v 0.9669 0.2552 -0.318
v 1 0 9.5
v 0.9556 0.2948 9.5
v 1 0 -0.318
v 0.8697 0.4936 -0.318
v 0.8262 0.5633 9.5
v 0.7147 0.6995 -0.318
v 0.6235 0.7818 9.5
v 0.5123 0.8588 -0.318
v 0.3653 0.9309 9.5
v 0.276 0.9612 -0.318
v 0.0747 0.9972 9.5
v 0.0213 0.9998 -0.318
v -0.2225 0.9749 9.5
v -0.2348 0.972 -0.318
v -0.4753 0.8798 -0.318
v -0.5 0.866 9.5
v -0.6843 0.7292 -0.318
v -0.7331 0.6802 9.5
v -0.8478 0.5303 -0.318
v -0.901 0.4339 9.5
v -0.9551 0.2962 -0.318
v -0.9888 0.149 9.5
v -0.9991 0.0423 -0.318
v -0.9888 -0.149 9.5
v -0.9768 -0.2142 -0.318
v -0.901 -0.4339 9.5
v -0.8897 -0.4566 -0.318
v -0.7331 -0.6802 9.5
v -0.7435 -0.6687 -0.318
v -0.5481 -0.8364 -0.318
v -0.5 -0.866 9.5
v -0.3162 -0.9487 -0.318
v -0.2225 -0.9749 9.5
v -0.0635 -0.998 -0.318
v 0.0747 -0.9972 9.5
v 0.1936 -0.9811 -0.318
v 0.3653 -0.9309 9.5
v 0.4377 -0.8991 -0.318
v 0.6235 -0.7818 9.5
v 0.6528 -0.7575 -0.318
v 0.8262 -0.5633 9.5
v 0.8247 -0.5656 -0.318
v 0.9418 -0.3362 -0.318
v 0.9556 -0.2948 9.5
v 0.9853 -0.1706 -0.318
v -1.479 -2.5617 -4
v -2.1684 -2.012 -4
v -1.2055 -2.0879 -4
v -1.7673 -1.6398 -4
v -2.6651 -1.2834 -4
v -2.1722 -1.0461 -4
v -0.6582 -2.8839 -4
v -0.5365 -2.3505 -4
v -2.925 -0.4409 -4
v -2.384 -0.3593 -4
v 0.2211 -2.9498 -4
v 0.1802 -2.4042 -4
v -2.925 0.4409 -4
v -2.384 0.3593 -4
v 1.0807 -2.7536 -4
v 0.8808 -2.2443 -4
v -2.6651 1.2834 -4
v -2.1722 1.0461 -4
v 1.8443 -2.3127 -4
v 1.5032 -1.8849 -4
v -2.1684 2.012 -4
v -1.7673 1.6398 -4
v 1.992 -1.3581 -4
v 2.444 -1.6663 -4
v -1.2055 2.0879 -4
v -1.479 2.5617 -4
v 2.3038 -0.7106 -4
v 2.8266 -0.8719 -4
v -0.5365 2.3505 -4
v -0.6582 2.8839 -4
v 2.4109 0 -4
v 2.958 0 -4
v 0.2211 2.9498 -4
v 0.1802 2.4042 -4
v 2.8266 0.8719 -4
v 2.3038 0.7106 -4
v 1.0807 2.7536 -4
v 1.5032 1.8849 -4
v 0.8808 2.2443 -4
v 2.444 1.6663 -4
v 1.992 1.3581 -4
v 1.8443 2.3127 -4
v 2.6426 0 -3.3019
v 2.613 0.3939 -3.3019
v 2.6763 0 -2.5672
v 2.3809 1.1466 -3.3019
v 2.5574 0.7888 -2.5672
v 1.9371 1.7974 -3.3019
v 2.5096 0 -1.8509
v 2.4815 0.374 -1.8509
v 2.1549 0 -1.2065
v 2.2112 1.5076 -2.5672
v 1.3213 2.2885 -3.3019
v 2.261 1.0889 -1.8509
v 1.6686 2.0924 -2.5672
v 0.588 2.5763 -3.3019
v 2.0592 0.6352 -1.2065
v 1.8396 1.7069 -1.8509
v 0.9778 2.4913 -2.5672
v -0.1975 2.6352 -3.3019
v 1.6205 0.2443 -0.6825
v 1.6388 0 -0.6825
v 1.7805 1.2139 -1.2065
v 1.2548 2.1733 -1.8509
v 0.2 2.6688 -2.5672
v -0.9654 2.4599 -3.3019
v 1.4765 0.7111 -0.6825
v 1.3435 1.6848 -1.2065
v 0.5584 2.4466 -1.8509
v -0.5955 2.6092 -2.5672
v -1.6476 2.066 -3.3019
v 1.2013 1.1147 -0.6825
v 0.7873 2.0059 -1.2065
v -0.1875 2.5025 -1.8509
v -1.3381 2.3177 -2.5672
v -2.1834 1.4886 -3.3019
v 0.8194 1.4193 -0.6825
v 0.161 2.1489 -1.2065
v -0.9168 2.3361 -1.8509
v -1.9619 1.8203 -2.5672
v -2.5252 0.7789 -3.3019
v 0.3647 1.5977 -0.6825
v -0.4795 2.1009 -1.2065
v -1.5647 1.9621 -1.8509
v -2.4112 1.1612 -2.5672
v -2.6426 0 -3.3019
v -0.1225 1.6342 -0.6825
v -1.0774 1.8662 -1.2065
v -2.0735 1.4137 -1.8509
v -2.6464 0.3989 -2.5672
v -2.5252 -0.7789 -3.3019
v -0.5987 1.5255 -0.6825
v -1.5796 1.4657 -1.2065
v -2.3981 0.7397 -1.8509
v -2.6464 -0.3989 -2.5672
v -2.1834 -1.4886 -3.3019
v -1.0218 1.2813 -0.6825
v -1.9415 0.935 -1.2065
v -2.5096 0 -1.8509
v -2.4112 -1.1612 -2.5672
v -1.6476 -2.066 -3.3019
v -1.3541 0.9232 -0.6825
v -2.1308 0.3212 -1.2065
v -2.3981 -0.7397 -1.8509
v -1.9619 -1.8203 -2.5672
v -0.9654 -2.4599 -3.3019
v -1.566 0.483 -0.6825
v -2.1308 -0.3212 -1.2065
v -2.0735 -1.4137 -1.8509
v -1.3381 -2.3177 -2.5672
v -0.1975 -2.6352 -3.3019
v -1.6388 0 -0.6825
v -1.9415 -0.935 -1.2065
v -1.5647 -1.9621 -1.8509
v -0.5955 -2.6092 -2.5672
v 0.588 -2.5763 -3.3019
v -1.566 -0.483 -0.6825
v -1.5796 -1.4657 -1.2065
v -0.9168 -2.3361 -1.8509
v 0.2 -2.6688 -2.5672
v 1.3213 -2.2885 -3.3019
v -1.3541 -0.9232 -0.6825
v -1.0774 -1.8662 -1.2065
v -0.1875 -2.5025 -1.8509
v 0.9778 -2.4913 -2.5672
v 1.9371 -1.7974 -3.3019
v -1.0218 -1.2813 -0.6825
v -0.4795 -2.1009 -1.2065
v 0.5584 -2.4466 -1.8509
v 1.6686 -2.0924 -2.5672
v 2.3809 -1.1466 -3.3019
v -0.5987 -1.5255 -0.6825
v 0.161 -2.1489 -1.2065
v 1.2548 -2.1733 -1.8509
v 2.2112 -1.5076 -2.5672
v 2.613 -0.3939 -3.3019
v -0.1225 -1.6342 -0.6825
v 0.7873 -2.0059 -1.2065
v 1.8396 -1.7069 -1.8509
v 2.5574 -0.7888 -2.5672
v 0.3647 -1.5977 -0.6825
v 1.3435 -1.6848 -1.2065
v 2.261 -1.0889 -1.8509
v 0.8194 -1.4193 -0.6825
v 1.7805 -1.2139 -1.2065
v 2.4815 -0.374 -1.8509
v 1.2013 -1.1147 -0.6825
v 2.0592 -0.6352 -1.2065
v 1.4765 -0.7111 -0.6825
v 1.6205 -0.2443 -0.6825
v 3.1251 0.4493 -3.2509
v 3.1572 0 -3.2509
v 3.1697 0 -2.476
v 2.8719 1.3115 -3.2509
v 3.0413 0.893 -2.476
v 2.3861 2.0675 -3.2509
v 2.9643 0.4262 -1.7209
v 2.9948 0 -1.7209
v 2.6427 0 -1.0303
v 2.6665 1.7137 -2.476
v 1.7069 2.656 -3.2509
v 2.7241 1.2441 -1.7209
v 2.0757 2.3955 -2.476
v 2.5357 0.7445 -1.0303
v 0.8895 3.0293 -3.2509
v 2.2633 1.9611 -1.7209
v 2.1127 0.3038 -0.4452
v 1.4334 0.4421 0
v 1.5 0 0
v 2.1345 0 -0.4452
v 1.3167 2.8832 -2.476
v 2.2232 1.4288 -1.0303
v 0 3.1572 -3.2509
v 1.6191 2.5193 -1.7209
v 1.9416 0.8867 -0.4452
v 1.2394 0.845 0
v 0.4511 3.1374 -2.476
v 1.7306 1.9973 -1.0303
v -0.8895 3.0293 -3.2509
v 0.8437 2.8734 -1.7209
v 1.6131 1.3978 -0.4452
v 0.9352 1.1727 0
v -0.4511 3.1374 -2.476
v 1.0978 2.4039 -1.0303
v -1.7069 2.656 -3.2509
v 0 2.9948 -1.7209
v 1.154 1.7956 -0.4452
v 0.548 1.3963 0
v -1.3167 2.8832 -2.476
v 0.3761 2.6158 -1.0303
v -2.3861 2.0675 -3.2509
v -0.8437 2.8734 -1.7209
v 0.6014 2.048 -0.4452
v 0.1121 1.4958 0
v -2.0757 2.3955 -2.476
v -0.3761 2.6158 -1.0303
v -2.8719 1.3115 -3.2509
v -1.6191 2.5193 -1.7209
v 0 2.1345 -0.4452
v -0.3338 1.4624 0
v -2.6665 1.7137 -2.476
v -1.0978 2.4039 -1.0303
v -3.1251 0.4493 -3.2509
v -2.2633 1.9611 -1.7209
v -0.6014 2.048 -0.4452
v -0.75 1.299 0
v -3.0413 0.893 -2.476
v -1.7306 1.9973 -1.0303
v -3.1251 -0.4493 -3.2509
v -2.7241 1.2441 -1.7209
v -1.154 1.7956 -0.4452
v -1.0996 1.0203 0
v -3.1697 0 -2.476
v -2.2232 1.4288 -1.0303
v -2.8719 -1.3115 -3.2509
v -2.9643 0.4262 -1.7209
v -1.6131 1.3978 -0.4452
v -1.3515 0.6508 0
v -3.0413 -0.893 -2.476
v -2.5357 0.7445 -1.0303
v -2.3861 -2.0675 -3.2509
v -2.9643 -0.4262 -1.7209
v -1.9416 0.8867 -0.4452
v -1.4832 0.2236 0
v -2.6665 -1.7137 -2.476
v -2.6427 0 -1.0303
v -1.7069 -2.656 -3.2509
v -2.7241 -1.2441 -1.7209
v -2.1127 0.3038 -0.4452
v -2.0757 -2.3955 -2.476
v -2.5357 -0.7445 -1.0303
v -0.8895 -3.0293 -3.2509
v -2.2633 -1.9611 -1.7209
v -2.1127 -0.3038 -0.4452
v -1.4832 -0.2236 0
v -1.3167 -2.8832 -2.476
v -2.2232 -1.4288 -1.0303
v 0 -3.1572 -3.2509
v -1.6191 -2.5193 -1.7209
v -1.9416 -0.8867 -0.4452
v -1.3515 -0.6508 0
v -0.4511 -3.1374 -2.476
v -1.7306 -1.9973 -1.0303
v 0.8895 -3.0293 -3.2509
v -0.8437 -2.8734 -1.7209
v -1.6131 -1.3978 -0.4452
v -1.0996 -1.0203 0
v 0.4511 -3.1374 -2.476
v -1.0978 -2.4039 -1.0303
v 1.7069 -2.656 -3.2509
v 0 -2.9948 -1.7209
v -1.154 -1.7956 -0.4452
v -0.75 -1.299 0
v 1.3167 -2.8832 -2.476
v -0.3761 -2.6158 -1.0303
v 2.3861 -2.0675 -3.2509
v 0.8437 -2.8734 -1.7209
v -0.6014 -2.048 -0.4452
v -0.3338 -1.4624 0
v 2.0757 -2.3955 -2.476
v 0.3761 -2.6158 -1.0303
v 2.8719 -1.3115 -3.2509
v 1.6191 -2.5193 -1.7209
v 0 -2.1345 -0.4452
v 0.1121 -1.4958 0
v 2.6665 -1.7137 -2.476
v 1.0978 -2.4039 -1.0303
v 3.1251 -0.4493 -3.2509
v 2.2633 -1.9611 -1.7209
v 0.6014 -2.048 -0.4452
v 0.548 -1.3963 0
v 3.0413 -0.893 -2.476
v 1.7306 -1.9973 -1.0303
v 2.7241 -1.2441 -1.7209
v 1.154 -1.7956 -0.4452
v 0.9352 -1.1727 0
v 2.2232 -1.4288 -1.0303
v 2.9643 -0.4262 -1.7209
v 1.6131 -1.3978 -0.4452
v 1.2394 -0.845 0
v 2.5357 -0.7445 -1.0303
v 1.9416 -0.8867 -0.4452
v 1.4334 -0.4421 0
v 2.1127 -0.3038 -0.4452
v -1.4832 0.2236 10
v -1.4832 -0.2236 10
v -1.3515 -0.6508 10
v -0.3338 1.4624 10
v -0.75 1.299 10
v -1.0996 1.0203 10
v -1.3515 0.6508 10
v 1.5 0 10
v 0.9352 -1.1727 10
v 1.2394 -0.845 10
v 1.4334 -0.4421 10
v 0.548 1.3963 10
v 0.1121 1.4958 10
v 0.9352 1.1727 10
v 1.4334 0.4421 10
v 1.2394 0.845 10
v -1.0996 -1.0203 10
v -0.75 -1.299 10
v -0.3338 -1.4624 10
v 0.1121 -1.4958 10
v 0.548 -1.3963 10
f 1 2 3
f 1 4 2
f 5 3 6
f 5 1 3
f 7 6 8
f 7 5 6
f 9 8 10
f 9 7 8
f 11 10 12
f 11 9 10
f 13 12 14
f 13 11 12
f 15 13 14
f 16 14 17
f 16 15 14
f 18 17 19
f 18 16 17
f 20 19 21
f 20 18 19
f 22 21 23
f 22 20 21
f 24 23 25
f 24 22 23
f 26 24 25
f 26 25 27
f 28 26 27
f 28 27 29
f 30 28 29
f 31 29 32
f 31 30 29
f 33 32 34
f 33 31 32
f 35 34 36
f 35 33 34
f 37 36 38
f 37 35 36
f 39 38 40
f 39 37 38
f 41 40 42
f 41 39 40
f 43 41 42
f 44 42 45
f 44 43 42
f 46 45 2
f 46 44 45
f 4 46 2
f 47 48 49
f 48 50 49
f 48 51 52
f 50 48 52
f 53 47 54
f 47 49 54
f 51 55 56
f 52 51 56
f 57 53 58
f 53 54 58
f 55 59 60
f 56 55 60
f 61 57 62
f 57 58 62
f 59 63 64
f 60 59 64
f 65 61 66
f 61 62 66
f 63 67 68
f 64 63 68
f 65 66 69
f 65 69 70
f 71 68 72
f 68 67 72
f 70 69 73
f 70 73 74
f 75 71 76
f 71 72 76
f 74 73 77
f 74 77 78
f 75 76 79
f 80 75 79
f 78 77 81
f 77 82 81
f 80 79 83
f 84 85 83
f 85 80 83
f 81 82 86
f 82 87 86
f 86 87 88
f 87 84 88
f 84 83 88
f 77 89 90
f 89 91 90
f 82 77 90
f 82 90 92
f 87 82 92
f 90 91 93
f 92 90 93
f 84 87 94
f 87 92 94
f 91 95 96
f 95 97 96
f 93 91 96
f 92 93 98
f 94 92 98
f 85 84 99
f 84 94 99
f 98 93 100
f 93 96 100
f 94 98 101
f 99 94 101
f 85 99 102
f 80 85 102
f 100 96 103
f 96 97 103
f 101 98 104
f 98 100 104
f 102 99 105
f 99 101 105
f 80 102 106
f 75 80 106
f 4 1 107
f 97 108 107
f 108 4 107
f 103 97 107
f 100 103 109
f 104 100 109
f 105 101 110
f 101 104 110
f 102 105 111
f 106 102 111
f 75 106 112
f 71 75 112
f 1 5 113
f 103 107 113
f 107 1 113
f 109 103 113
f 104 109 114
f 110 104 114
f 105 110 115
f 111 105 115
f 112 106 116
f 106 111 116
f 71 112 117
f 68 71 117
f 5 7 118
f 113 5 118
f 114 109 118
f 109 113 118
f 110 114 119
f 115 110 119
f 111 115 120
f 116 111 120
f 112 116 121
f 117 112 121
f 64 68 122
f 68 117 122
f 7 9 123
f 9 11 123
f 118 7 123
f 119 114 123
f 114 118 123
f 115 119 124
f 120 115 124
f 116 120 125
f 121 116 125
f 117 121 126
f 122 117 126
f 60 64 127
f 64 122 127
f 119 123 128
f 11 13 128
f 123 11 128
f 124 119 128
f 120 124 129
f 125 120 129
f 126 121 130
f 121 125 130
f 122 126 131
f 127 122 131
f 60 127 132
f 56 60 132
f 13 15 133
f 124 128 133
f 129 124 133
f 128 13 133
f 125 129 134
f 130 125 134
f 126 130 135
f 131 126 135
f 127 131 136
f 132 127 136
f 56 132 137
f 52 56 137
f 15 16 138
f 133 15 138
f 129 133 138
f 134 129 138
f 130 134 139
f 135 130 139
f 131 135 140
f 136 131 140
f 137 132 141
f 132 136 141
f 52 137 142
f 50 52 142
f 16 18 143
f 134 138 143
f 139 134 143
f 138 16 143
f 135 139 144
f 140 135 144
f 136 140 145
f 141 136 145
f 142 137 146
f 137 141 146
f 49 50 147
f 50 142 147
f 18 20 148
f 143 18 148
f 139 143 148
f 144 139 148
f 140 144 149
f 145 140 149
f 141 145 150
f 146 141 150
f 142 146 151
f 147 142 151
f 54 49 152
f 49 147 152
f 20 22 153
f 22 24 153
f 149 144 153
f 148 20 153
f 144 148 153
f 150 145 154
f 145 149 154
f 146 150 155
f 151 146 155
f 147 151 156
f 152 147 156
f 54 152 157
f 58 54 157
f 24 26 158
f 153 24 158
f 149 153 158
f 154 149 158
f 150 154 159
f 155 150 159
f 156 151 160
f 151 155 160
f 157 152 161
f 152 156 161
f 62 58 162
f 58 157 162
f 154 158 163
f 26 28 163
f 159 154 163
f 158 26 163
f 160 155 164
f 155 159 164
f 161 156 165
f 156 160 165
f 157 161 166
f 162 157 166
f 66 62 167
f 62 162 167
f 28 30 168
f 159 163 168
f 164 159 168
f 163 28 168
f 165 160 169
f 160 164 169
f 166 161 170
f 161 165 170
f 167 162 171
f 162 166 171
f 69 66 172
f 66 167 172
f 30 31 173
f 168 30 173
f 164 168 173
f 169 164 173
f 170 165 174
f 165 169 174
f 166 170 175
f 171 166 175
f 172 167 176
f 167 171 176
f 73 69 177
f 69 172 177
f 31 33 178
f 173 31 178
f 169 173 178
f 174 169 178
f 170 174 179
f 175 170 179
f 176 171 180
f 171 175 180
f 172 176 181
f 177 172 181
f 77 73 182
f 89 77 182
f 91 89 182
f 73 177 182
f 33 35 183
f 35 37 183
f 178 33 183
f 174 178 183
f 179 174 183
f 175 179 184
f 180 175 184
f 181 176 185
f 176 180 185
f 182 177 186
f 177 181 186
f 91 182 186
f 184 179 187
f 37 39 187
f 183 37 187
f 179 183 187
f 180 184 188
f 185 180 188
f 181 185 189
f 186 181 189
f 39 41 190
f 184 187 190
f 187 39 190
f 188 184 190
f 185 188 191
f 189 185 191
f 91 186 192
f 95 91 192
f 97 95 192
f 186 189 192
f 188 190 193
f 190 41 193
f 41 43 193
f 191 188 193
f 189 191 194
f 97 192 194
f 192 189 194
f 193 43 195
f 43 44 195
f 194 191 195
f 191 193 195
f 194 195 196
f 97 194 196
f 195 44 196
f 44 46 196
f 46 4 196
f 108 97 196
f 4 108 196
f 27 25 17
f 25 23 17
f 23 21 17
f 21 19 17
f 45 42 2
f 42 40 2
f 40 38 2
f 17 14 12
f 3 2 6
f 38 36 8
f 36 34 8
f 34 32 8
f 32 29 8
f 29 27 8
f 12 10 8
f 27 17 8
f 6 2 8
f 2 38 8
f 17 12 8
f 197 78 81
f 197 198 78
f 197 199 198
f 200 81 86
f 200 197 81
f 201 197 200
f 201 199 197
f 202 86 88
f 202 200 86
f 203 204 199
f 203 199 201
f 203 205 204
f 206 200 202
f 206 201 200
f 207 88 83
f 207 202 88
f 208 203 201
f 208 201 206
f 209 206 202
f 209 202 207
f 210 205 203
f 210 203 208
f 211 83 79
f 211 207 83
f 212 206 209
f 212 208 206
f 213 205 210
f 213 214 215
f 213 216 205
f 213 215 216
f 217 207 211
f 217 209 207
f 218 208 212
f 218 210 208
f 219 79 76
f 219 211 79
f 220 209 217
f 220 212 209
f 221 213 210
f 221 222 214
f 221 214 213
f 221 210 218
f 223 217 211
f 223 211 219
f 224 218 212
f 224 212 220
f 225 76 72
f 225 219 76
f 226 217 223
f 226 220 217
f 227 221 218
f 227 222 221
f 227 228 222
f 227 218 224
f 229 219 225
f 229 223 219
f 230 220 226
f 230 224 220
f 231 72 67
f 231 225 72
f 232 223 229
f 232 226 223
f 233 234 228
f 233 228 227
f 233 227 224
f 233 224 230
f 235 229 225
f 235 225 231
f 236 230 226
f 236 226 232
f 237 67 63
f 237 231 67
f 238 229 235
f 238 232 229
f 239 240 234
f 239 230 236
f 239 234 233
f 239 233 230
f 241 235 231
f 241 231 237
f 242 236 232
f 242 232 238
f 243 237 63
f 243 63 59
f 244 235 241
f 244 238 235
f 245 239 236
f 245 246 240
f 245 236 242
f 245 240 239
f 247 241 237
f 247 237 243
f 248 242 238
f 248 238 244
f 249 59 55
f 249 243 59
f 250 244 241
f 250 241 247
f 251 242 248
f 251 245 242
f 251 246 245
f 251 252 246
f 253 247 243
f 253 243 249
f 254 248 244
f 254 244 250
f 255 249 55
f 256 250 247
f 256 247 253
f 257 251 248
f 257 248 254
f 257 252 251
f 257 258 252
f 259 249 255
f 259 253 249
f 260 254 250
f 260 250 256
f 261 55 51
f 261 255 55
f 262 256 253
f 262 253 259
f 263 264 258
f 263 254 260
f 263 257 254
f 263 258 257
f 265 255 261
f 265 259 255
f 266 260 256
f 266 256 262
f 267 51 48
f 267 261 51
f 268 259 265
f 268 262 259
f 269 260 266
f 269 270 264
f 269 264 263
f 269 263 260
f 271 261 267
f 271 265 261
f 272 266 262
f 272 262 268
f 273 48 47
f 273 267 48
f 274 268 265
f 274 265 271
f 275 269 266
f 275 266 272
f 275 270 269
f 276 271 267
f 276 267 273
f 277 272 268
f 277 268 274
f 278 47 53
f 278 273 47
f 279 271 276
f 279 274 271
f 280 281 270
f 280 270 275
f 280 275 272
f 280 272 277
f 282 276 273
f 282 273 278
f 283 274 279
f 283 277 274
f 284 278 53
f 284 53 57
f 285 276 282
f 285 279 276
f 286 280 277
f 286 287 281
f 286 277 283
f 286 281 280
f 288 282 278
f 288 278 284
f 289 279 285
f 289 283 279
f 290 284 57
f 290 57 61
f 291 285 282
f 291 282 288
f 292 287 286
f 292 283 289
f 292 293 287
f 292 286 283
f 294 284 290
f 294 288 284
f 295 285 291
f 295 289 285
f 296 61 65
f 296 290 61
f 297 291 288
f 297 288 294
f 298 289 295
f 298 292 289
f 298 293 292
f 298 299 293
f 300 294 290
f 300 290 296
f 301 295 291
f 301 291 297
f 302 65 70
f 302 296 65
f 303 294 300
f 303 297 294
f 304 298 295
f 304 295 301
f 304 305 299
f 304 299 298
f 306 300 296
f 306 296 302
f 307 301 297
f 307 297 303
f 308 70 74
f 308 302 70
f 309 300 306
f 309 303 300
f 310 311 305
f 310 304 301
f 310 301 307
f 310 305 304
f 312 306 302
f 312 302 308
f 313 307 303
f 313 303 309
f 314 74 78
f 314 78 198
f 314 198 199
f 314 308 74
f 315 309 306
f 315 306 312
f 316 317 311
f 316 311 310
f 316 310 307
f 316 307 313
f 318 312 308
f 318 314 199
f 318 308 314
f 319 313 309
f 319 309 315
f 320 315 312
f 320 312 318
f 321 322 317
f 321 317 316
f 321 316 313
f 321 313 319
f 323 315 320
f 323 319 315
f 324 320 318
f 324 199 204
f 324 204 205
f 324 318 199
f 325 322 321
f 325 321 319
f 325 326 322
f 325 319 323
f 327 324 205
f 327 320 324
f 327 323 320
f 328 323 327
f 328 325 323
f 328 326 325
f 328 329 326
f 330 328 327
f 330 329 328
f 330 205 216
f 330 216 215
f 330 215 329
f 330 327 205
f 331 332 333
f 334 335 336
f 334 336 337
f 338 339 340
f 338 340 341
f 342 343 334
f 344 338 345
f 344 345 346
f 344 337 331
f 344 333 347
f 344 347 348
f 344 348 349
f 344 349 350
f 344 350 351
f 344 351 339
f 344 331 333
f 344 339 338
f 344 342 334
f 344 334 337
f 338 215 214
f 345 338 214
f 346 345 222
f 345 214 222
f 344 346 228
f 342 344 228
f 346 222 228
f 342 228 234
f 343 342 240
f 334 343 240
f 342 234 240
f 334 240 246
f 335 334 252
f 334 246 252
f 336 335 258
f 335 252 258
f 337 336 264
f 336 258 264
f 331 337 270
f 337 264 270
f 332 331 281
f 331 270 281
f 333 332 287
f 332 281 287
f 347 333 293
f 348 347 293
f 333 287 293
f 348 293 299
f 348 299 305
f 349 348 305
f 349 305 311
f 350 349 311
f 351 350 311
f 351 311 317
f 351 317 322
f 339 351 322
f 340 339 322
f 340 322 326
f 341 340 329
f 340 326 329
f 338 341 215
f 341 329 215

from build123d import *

# Parameters (mm, degrees)
SKETCH1_R           = 1.5
BOSS_EXTRUDE1_DEPTH = 10
SKETCH3_R           = 4
CUT_EXTRUDE2_DEPTH  = 6
SHELL11_T           = -0.5


# Read off the part's stored shape, not the designer's step: Dome1
with BuildPart() as part:
    # Sketch1 → Boss-Extrude1 (new body)
    with BuildSketch(Plane.XY):
        Circle(SKETCH1_R)
    extrude(amount=BOSS_EXTRUDE1_DEPTH)

    # Dome1 outline → Dome1 (revolve)
    with BuildSketch(Plane.XZ):
        with BuildLine():
            Line((0, 2e-09), (0, -6))
            ThreePointArc((0, -6), (3.09232922, -3.585582304), (1.499999999, 1e-09))
            Line((1.499999999, 1e-09), (0, 2e-09))
        make_face()
    revolve(axis=Axis((0, 0, 0), (0, 0, 1)))

    # Sketch3 → Cut-Extrude2 (cut)
    with BuildSketch(Plane.XY.offset(-10)):
        Circle(SKETCH3_R)
    extrude(amount=CUT_EXTRUDE2_DEPTH, mode=Mode.SUBTRACT)

    # Shell11
    shell11_openings = [part.faces().sort_by_distance(p)[0] for p in [
        (1e-09, 0, -4),
    ]]
    offset(amount=SHELL11_T, openings=shell11_openings, kind=Kind.INTERSECTION)


solid = part.part
